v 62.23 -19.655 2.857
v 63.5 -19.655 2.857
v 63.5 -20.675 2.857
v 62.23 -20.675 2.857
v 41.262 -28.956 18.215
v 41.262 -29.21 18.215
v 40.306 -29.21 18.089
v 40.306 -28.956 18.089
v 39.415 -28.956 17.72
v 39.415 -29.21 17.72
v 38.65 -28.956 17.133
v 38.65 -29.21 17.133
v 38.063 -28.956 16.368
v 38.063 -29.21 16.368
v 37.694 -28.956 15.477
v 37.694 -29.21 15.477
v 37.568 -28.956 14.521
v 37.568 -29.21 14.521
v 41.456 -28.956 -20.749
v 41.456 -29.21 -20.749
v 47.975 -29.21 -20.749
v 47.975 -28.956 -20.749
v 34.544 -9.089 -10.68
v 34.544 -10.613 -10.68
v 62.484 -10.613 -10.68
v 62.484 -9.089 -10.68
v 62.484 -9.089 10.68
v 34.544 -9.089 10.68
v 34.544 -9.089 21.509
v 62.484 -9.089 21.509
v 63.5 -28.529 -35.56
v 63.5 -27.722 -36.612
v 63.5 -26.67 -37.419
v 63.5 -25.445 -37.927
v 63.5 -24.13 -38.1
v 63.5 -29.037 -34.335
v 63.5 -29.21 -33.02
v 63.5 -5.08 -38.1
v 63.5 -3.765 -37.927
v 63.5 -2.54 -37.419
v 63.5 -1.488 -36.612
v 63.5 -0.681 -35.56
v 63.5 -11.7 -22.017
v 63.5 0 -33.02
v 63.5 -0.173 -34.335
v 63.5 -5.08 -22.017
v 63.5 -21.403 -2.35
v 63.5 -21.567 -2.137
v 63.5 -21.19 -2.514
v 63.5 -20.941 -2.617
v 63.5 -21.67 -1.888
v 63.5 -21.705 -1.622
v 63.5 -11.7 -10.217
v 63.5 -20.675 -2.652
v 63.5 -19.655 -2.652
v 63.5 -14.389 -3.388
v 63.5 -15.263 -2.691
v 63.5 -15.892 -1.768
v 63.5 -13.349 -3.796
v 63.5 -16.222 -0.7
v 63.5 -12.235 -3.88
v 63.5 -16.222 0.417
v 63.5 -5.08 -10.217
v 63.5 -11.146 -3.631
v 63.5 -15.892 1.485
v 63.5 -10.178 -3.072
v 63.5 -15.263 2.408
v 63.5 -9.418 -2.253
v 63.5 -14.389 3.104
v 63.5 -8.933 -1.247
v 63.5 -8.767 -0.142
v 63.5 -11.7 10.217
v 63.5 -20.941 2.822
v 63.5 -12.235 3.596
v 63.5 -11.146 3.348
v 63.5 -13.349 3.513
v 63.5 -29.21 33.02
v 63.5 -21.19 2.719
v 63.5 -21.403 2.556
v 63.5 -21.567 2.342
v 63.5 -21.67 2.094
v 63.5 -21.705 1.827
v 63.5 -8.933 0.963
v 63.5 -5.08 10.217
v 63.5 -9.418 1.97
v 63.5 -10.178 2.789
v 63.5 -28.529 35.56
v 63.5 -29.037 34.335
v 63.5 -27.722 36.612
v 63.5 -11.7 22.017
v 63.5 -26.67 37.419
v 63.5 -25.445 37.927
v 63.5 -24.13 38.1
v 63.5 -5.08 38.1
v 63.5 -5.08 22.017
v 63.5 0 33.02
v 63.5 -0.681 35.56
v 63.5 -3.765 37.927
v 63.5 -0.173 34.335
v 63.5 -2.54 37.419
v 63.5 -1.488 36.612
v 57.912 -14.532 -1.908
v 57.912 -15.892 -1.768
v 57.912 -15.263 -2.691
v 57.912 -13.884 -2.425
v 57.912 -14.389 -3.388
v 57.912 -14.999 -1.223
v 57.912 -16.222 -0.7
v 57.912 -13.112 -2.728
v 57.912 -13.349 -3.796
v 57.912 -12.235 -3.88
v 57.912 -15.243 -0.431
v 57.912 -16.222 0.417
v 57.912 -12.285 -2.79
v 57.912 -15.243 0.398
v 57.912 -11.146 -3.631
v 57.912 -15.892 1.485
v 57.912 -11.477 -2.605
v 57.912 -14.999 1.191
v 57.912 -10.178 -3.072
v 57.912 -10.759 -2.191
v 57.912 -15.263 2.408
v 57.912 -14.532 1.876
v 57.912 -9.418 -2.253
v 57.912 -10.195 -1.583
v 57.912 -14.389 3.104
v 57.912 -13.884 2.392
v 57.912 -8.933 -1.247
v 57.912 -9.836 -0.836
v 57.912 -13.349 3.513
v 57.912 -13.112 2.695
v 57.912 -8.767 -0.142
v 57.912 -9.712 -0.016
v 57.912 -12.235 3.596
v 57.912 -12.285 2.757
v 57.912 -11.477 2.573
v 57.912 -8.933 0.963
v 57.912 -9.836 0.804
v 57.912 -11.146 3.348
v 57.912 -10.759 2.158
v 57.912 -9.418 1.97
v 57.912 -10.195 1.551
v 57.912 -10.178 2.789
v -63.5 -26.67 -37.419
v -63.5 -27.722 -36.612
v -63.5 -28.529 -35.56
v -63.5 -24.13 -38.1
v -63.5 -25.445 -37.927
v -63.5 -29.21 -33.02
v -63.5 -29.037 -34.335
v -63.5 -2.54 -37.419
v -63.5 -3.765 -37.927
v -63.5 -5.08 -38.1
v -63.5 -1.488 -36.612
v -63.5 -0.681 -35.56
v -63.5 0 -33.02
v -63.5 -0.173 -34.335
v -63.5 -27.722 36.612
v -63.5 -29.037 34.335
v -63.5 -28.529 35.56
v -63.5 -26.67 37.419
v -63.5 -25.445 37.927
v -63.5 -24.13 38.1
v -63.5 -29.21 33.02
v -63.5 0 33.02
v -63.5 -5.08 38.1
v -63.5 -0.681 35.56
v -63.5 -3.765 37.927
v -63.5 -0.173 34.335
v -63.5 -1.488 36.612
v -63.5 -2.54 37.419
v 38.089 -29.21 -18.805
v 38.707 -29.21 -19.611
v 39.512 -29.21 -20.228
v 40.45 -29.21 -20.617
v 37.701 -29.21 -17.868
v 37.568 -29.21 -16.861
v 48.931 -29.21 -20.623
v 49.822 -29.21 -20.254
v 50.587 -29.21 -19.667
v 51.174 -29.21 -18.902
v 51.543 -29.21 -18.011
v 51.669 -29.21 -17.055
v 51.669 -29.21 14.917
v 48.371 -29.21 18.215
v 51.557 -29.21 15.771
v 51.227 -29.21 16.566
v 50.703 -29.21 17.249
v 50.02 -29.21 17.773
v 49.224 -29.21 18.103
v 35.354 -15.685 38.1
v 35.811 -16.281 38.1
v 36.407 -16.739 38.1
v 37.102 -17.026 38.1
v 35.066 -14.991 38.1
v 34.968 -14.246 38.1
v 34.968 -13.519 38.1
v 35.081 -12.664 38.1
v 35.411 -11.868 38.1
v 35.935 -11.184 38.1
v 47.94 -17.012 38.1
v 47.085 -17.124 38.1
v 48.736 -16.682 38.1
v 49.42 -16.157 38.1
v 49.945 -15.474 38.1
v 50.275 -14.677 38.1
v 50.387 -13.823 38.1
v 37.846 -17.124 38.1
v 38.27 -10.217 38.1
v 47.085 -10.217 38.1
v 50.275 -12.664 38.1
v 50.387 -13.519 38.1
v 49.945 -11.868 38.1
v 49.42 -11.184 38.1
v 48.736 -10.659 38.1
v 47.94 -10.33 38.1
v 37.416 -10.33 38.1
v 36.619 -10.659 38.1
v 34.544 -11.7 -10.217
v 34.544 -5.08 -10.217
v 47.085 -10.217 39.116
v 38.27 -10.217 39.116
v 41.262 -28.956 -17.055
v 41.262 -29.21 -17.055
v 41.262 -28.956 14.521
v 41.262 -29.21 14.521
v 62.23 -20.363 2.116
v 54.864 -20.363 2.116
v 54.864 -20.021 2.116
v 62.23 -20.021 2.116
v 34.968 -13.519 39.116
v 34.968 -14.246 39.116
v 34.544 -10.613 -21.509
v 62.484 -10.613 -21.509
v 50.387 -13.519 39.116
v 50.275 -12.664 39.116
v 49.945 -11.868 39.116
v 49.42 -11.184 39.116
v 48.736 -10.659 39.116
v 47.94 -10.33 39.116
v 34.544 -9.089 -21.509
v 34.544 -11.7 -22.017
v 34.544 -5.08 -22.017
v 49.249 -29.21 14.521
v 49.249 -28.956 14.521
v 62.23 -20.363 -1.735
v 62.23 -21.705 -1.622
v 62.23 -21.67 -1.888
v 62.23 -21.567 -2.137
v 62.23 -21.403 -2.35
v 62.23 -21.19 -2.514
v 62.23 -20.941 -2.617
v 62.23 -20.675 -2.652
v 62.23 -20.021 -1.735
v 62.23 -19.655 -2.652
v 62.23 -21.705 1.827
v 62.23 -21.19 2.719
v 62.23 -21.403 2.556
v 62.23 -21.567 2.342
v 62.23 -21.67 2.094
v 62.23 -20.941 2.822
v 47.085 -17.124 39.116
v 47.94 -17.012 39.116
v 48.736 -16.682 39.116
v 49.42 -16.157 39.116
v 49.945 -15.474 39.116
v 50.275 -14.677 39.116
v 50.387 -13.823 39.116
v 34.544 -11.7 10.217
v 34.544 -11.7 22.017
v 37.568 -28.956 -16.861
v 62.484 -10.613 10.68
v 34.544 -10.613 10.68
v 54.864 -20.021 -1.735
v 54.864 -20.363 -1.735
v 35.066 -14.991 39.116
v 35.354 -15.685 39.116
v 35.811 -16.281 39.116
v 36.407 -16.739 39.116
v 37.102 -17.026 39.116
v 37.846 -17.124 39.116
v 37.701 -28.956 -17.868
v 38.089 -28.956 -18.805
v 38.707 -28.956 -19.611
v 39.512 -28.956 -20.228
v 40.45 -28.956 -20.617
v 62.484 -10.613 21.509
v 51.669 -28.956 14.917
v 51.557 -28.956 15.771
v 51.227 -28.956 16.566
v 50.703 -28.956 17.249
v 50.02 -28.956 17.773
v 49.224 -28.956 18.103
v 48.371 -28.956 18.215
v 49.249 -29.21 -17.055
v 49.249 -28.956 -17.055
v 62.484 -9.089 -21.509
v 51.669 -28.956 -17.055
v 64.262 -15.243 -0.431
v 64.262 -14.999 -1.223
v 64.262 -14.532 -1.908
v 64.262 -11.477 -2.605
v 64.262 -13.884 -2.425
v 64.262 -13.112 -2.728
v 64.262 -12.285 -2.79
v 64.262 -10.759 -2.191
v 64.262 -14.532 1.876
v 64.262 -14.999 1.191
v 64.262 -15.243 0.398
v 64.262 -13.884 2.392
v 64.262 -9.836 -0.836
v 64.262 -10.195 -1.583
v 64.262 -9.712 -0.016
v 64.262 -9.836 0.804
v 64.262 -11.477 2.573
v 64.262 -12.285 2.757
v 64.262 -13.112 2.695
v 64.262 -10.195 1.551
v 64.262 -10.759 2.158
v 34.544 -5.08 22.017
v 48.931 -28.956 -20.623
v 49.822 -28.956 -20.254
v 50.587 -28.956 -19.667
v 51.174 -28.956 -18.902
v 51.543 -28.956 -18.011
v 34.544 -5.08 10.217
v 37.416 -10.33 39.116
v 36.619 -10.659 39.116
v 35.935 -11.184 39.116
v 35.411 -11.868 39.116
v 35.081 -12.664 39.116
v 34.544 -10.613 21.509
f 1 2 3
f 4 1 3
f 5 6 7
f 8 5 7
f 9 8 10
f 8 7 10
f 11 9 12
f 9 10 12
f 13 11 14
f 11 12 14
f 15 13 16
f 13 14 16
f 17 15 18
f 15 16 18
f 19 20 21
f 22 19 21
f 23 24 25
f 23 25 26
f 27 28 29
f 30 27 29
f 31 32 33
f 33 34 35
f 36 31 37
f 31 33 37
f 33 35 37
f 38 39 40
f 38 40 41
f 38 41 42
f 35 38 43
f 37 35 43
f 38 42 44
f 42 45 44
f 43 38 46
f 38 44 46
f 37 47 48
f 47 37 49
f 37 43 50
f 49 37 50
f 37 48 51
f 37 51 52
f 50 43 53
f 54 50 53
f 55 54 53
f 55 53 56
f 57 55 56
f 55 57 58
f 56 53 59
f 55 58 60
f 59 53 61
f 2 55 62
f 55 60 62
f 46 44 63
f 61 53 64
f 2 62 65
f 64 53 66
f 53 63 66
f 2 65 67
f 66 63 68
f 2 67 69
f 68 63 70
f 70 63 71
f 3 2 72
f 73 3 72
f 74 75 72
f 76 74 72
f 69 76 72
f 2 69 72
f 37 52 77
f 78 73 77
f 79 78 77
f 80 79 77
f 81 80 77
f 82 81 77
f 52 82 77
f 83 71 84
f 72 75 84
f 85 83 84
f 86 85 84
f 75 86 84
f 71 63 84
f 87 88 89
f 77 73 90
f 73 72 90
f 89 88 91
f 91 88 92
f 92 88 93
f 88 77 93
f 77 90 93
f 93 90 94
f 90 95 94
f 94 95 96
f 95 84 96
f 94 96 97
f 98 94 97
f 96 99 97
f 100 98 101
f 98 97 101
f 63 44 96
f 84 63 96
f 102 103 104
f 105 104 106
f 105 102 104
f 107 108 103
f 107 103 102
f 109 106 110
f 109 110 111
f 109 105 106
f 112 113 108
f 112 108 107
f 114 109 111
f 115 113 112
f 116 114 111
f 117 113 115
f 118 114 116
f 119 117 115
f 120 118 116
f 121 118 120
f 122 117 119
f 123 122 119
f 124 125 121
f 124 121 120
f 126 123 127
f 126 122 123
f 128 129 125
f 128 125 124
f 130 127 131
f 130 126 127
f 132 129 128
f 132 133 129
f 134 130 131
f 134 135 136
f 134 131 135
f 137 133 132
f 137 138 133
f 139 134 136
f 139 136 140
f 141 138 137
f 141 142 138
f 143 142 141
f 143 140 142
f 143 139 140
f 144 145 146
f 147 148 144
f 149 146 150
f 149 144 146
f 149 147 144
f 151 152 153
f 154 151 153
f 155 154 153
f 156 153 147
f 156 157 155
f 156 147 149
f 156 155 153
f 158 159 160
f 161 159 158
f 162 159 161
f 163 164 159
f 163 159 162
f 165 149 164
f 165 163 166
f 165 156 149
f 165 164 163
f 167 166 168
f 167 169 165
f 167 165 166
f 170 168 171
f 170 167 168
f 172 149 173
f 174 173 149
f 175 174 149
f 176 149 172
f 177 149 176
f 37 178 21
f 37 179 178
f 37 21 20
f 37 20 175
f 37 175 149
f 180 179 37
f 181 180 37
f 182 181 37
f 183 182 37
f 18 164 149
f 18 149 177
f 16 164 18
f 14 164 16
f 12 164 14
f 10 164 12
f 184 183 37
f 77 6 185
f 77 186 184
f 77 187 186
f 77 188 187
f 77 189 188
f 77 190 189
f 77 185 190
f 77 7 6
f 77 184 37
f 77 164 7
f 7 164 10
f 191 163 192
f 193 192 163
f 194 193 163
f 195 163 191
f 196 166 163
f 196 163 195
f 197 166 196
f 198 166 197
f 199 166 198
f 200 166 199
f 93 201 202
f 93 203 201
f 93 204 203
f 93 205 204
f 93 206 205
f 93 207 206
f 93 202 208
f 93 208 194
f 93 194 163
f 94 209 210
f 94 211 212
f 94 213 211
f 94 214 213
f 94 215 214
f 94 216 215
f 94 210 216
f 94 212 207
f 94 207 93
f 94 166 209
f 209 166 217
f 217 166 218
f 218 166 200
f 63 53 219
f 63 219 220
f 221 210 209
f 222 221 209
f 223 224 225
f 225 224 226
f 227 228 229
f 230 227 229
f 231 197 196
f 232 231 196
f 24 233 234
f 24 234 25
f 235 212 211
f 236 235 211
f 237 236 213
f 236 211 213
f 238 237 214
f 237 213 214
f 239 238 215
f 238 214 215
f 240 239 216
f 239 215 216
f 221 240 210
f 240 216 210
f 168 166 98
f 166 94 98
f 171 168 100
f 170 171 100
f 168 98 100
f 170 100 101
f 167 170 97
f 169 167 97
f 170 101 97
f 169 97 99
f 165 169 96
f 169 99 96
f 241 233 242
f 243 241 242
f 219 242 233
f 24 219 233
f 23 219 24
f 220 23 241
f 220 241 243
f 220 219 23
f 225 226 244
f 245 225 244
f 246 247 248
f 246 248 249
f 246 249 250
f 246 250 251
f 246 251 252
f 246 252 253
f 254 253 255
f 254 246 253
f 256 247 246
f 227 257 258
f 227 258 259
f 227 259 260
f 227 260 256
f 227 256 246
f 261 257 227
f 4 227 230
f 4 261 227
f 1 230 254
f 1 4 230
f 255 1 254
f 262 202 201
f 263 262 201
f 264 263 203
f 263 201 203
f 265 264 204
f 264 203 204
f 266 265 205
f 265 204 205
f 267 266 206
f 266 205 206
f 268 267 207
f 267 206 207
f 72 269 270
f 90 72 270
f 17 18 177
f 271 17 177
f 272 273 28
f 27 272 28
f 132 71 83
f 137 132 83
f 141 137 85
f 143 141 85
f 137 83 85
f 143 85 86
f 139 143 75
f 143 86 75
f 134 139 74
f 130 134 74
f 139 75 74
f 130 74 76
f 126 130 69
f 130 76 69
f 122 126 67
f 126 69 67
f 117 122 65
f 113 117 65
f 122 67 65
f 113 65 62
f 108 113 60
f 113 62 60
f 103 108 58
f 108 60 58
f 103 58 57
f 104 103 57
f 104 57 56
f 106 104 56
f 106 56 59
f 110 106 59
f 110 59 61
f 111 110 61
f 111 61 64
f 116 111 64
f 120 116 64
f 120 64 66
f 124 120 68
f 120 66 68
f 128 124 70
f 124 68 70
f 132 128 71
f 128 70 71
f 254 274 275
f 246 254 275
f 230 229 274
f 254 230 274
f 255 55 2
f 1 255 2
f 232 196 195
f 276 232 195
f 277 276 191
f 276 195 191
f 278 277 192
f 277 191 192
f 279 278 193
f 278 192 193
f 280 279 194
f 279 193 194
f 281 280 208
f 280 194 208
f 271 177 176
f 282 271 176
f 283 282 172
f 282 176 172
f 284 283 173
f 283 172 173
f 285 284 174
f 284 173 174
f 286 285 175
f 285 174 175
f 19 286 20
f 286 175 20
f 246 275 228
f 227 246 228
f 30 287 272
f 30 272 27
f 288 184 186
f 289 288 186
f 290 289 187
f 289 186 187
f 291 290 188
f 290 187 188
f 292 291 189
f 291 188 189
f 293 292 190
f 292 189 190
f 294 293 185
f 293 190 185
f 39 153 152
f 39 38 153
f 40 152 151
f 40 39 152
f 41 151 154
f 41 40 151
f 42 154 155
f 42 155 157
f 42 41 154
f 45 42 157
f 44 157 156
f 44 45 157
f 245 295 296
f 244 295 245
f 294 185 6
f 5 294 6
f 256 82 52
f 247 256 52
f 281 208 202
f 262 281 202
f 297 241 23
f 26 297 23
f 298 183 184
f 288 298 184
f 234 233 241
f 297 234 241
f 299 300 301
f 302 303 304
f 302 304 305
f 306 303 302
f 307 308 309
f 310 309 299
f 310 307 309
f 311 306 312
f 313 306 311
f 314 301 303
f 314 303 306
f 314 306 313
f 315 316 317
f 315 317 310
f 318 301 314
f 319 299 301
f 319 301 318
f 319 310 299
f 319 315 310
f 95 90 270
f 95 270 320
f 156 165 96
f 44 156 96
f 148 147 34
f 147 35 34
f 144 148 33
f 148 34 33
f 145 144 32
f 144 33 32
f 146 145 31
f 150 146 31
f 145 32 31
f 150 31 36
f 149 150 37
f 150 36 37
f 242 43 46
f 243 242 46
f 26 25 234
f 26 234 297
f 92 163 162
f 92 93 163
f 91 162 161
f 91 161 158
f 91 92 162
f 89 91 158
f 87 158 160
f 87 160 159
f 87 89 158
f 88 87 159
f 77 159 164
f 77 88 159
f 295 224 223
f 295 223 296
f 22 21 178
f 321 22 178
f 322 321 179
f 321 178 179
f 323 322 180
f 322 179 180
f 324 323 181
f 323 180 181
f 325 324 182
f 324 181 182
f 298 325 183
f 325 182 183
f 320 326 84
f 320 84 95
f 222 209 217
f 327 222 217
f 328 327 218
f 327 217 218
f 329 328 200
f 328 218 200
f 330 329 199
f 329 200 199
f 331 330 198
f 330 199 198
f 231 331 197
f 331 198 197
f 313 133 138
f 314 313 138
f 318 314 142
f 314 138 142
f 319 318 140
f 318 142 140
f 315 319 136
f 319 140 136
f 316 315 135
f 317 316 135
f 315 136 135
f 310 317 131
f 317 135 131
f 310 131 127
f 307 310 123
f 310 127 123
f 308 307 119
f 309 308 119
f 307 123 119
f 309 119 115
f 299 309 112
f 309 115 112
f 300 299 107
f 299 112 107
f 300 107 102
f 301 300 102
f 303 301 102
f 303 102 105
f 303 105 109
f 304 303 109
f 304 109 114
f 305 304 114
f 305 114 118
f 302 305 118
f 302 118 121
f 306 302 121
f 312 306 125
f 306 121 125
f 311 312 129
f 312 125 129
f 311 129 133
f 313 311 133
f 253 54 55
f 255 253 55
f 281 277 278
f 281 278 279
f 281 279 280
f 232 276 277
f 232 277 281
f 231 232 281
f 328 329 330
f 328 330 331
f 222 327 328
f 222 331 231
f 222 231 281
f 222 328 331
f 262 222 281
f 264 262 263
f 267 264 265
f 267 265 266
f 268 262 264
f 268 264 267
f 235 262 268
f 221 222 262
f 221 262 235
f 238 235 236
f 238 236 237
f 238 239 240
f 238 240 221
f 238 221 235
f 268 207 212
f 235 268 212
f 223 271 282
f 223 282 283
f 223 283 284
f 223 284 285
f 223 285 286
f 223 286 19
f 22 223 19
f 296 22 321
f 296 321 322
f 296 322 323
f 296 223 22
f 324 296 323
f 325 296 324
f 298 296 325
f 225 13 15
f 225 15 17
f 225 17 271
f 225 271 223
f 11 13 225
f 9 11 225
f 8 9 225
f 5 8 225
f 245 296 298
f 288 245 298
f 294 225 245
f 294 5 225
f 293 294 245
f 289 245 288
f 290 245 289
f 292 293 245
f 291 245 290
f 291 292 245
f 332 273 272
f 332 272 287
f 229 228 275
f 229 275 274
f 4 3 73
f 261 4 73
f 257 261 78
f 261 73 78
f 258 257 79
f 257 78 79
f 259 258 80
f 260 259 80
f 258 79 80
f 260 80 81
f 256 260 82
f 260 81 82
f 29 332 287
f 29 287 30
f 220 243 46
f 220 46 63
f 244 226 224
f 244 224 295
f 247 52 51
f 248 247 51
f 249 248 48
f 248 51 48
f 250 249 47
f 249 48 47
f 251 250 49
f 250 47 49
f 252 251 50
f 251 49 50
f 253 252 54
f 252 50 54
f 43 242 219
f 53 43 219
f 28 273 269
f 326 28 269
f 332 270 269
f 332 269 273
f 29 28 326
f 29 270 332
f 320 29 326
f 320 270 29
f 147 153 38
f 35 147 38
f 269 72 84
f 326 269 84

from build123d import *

# Parameters (mm, degrees)
F0_W      = 127
F0_H      = 76.2
F1_DEPTH  = 29.21
F2_R      = 5.08
F3_W      = 6.6195318941
F3_H      = 11.800037697
F4_DEPTH  = 28.956
F5_W      = 1.524
F5_H      = 10.8286906034
F6_DEPTH  = 27.94
F7_R      = 3.7484313793
F8_DEPTH  = 5.588
F9_R      = 2.7812538223
F10_DEPTH = 6.35
F12_DEPTH = 8.636
F14_DEPTH = 7.366
F16_DEPTH = 3.556
F17_DEPTH = 4.572
F18_W     = 7.9864859581
F18_H     = 31.5765572539
F19_DEPTH = 0.254


with BuildPart() as f1:
    # F0 (on Front) → F1 (new body)
    with BuildSketch(Plane.XZ):
        Rectangle(F0_W, F0_H)
    extrude(amount=F1_DEPTH)

    # F2
    f2_edges = [f1.edges().sort_by_distance(p)[0] for p in [
        (0, -29.21, 38.1),
        (0, 0, 38.1),
        (0, -29.21, -38.1),
        (0, 0, -38.1),
    ]]
    fillet(f2_edges, radius=F2_R)

    # F3 (on face) → F4 (cut)
    with BuildSketch(Plane.YZ.offset(63.5)):
        with Locations((-8.3897659471, 16.1171229556)):
            Rectangle(F3_W, F3_H)
        with Locations((-8.3897659471, -16.1171229556)):
            Rectangle(F3_W, F3_H)
    extrude(amount=-F4_DEPTH, mode=Mode.SUBTRACT)

    # F5 (on face) → F6 (join)
    with BuildSketch(Plane.YZ.offset(34.544)):
        with Locations((-9.8508370389, 16.0947965024)):
            Rectangle(F5_W, F5_H)
        with Locations((-9.8508370389, -16.0947965024)):
            Rectangle(F5_W, F5_H)
    extrude(amount=F6_DEPTH)

    # F7 (on face) → F8 (cut)
    with BuildSketch(Plane.YZ.offset(63.5)):
        with Locations((-12.5152766346, -0.14176574)):
            Circle(F7_R)
    extrude(amount=-F8_DEPTH, mode=Mode.SUBTRACT)

    # F9 (on face) → F10 (join)
    with BuildSketch(Plane.YZ.offset(57.912)):
        with Locations((-12.4932004692, -0.0162060605)):
            Circle(F9_R)
    extrude(amount=F10_DEPTH)

    # F11 (on face) → F12 (cut)
    with BuildSketch(Plane.YZ.offset(63.5)):
        with BuildLine():
            Line((-19.6553119308, 2.8573502786), (-20.6747086321, 2.8573502786))
            ThreePointArc((-20.6747086321, 2.8573502786), (-21.4033806509, 2.5555244459), (-21.7052064836, 1.8268524271))
            Line((-21.7052064836, 1.8268524271), (-21.7052064836, -1.6216995807))
            ThreePointArc((-21.7052064836, -1.6216995807), (-21.4033790258, -2.3503755229), (-20.6747030836, -2.6522029807))
            Line((-20.6747030836, -2.6522029807), (-19.6553119308, -2.6522029807))
            Line((-19.6553119308, -2.6522029807), (-19.6553119308, 2.8573502786))
        make_face()
    extrude(amount=-F12_DEPTH, mode=Mode.SUBTRACT)

    # F13 (on face) → F14 (join)
    with BuildSketch(Plane.YZ.offset(54.864)):
        with BuildLine():
            Line((-19.6553119308, -2.6522029807), (-19.6553119308, 2.8573502786))
            Line((-19.6553119308, 2.8573502786), (-20.6747086321, 2.8573502786))
            ThreePointArc((-20.6747086321, 2.8573502786), (-21.4033806509, 2.5555244459), (-21.7052064836, 1.8268524271))
            Line((-21.7052064836, 1.8268524271), (-21.7052064836, -1.6216995807))
            ThreePointArc((-21.7052064836, -1.6216995807), (-21.4033790258, -2.3503755229), (-20.6747030836, -2.6522029807))
            Line((-20.6747030836, -2.6522029807), (-19.6553119308, -2.6522029807))
        make_face()
        Polygon((-20.3632637858, 1.3027831301), (-20.3632637858, 2.1156521834), (-20.0210027397, 2.1156521834), (-20.0210027397, 1.3027831301), (-20.0210027397, 0), (-20.0210027397, -1.7347801622), (-20.3632637858, -1.7347801622), (-20.3632637858, 0), align=None, mode=Mode.SUBTRACT)
    extrude(amount=F14_DEPTH)

    # F15 (on face) → F16 (cut)
    with BuildSketch(Plane.XY.offset(38.1)):
        with BuildLine():
            Line((47.0853128431, -10.2171041071), (38.2701487959, -10.2171041071))
            ThreePointArc((38.2701487959, -10.2171041071), (35.9354614141, -11.1841632846), (34.9684022367, -13.5188506663))
            Line((34.9684022367, -13.5188506663), (34.9684022367, -14.2463892698))
            ThreePointArc((34.9684022367, -14.2463892698), (35.8113644771, -16.2814801432), (37.8464553505, -17.1244423836))
            Line((37.8464553505, -17.1244423836), (47.0853187936, -17.1244423836))
            ThreePointArc((47.0853187936, -17.1244423836), (49.4200057799, -16.15738337), (50.3870647936, -13.8226963836))
            Line((50.3870647936, -13.8226963836), (50.3870647936, -13.5188560576))
            ThreePointArc((50.3870647936, -13.5188560576), (49.4200040371, -11.1841648636), (47.0853128431, -10.2171041071))
        make_face()
    extrude(amount=-F16_DEPTH, mode=Mode.SUBTRACT)

    # F17 (add): a face of the model
    f17_faces = [f1.faces().sort_by_distance(p)[0] for p in [
        (42.6393602825, -13.6846721525, 34.544),
    ]]
    extrude(f17_faces, amount=F17_DEPTH)

    # F18 (on face) → F19 (cut)
    with BuildSketch(Plane.XZ.offset(29.21)):
        with BuildLine():
            Line((48.3708519327, 18.215091899), (41.2623919547, 18.215091899))
            ThreePointArc((41.2623919547, 18.215091899), (38.6504034004, 17.1331708151), (37.5684823165, 14.5211822609))
            Line((37.5684823165, 14.5211822609), (37.5684823165, -16.8614557905))
            ThreePointArc((37.5684823165, -16.8614557905), (38.7072046405, -19.610574669), (41.456323519, -20.749296993))
            Line((41.456323519, -20.749296993), (47.9751093816, -20.749296993))
            ThreePointArc((47.9751093816, -20.749296993), (50.587106677, -19.6673722884), (51.6690313816, -17.055374993))
            Line((51.6690313816, -17.055374993), (51.6690313816, 14.9169124501))
            ThreePointArc((51.6690313816, 14.9169124501), (50.7030169866, 17.249077504), (48.3708519327, 18.215091899))
        make_face()
        with Locations((45.2556349337, -1.2670963661)):
            Rectangle(F18_W, F18_H, mode=Mode.SUBTRACT)
    extrude(amount=-F19_DEPTH, mode=Mode.SUBTRACT)


solid = f1.part
